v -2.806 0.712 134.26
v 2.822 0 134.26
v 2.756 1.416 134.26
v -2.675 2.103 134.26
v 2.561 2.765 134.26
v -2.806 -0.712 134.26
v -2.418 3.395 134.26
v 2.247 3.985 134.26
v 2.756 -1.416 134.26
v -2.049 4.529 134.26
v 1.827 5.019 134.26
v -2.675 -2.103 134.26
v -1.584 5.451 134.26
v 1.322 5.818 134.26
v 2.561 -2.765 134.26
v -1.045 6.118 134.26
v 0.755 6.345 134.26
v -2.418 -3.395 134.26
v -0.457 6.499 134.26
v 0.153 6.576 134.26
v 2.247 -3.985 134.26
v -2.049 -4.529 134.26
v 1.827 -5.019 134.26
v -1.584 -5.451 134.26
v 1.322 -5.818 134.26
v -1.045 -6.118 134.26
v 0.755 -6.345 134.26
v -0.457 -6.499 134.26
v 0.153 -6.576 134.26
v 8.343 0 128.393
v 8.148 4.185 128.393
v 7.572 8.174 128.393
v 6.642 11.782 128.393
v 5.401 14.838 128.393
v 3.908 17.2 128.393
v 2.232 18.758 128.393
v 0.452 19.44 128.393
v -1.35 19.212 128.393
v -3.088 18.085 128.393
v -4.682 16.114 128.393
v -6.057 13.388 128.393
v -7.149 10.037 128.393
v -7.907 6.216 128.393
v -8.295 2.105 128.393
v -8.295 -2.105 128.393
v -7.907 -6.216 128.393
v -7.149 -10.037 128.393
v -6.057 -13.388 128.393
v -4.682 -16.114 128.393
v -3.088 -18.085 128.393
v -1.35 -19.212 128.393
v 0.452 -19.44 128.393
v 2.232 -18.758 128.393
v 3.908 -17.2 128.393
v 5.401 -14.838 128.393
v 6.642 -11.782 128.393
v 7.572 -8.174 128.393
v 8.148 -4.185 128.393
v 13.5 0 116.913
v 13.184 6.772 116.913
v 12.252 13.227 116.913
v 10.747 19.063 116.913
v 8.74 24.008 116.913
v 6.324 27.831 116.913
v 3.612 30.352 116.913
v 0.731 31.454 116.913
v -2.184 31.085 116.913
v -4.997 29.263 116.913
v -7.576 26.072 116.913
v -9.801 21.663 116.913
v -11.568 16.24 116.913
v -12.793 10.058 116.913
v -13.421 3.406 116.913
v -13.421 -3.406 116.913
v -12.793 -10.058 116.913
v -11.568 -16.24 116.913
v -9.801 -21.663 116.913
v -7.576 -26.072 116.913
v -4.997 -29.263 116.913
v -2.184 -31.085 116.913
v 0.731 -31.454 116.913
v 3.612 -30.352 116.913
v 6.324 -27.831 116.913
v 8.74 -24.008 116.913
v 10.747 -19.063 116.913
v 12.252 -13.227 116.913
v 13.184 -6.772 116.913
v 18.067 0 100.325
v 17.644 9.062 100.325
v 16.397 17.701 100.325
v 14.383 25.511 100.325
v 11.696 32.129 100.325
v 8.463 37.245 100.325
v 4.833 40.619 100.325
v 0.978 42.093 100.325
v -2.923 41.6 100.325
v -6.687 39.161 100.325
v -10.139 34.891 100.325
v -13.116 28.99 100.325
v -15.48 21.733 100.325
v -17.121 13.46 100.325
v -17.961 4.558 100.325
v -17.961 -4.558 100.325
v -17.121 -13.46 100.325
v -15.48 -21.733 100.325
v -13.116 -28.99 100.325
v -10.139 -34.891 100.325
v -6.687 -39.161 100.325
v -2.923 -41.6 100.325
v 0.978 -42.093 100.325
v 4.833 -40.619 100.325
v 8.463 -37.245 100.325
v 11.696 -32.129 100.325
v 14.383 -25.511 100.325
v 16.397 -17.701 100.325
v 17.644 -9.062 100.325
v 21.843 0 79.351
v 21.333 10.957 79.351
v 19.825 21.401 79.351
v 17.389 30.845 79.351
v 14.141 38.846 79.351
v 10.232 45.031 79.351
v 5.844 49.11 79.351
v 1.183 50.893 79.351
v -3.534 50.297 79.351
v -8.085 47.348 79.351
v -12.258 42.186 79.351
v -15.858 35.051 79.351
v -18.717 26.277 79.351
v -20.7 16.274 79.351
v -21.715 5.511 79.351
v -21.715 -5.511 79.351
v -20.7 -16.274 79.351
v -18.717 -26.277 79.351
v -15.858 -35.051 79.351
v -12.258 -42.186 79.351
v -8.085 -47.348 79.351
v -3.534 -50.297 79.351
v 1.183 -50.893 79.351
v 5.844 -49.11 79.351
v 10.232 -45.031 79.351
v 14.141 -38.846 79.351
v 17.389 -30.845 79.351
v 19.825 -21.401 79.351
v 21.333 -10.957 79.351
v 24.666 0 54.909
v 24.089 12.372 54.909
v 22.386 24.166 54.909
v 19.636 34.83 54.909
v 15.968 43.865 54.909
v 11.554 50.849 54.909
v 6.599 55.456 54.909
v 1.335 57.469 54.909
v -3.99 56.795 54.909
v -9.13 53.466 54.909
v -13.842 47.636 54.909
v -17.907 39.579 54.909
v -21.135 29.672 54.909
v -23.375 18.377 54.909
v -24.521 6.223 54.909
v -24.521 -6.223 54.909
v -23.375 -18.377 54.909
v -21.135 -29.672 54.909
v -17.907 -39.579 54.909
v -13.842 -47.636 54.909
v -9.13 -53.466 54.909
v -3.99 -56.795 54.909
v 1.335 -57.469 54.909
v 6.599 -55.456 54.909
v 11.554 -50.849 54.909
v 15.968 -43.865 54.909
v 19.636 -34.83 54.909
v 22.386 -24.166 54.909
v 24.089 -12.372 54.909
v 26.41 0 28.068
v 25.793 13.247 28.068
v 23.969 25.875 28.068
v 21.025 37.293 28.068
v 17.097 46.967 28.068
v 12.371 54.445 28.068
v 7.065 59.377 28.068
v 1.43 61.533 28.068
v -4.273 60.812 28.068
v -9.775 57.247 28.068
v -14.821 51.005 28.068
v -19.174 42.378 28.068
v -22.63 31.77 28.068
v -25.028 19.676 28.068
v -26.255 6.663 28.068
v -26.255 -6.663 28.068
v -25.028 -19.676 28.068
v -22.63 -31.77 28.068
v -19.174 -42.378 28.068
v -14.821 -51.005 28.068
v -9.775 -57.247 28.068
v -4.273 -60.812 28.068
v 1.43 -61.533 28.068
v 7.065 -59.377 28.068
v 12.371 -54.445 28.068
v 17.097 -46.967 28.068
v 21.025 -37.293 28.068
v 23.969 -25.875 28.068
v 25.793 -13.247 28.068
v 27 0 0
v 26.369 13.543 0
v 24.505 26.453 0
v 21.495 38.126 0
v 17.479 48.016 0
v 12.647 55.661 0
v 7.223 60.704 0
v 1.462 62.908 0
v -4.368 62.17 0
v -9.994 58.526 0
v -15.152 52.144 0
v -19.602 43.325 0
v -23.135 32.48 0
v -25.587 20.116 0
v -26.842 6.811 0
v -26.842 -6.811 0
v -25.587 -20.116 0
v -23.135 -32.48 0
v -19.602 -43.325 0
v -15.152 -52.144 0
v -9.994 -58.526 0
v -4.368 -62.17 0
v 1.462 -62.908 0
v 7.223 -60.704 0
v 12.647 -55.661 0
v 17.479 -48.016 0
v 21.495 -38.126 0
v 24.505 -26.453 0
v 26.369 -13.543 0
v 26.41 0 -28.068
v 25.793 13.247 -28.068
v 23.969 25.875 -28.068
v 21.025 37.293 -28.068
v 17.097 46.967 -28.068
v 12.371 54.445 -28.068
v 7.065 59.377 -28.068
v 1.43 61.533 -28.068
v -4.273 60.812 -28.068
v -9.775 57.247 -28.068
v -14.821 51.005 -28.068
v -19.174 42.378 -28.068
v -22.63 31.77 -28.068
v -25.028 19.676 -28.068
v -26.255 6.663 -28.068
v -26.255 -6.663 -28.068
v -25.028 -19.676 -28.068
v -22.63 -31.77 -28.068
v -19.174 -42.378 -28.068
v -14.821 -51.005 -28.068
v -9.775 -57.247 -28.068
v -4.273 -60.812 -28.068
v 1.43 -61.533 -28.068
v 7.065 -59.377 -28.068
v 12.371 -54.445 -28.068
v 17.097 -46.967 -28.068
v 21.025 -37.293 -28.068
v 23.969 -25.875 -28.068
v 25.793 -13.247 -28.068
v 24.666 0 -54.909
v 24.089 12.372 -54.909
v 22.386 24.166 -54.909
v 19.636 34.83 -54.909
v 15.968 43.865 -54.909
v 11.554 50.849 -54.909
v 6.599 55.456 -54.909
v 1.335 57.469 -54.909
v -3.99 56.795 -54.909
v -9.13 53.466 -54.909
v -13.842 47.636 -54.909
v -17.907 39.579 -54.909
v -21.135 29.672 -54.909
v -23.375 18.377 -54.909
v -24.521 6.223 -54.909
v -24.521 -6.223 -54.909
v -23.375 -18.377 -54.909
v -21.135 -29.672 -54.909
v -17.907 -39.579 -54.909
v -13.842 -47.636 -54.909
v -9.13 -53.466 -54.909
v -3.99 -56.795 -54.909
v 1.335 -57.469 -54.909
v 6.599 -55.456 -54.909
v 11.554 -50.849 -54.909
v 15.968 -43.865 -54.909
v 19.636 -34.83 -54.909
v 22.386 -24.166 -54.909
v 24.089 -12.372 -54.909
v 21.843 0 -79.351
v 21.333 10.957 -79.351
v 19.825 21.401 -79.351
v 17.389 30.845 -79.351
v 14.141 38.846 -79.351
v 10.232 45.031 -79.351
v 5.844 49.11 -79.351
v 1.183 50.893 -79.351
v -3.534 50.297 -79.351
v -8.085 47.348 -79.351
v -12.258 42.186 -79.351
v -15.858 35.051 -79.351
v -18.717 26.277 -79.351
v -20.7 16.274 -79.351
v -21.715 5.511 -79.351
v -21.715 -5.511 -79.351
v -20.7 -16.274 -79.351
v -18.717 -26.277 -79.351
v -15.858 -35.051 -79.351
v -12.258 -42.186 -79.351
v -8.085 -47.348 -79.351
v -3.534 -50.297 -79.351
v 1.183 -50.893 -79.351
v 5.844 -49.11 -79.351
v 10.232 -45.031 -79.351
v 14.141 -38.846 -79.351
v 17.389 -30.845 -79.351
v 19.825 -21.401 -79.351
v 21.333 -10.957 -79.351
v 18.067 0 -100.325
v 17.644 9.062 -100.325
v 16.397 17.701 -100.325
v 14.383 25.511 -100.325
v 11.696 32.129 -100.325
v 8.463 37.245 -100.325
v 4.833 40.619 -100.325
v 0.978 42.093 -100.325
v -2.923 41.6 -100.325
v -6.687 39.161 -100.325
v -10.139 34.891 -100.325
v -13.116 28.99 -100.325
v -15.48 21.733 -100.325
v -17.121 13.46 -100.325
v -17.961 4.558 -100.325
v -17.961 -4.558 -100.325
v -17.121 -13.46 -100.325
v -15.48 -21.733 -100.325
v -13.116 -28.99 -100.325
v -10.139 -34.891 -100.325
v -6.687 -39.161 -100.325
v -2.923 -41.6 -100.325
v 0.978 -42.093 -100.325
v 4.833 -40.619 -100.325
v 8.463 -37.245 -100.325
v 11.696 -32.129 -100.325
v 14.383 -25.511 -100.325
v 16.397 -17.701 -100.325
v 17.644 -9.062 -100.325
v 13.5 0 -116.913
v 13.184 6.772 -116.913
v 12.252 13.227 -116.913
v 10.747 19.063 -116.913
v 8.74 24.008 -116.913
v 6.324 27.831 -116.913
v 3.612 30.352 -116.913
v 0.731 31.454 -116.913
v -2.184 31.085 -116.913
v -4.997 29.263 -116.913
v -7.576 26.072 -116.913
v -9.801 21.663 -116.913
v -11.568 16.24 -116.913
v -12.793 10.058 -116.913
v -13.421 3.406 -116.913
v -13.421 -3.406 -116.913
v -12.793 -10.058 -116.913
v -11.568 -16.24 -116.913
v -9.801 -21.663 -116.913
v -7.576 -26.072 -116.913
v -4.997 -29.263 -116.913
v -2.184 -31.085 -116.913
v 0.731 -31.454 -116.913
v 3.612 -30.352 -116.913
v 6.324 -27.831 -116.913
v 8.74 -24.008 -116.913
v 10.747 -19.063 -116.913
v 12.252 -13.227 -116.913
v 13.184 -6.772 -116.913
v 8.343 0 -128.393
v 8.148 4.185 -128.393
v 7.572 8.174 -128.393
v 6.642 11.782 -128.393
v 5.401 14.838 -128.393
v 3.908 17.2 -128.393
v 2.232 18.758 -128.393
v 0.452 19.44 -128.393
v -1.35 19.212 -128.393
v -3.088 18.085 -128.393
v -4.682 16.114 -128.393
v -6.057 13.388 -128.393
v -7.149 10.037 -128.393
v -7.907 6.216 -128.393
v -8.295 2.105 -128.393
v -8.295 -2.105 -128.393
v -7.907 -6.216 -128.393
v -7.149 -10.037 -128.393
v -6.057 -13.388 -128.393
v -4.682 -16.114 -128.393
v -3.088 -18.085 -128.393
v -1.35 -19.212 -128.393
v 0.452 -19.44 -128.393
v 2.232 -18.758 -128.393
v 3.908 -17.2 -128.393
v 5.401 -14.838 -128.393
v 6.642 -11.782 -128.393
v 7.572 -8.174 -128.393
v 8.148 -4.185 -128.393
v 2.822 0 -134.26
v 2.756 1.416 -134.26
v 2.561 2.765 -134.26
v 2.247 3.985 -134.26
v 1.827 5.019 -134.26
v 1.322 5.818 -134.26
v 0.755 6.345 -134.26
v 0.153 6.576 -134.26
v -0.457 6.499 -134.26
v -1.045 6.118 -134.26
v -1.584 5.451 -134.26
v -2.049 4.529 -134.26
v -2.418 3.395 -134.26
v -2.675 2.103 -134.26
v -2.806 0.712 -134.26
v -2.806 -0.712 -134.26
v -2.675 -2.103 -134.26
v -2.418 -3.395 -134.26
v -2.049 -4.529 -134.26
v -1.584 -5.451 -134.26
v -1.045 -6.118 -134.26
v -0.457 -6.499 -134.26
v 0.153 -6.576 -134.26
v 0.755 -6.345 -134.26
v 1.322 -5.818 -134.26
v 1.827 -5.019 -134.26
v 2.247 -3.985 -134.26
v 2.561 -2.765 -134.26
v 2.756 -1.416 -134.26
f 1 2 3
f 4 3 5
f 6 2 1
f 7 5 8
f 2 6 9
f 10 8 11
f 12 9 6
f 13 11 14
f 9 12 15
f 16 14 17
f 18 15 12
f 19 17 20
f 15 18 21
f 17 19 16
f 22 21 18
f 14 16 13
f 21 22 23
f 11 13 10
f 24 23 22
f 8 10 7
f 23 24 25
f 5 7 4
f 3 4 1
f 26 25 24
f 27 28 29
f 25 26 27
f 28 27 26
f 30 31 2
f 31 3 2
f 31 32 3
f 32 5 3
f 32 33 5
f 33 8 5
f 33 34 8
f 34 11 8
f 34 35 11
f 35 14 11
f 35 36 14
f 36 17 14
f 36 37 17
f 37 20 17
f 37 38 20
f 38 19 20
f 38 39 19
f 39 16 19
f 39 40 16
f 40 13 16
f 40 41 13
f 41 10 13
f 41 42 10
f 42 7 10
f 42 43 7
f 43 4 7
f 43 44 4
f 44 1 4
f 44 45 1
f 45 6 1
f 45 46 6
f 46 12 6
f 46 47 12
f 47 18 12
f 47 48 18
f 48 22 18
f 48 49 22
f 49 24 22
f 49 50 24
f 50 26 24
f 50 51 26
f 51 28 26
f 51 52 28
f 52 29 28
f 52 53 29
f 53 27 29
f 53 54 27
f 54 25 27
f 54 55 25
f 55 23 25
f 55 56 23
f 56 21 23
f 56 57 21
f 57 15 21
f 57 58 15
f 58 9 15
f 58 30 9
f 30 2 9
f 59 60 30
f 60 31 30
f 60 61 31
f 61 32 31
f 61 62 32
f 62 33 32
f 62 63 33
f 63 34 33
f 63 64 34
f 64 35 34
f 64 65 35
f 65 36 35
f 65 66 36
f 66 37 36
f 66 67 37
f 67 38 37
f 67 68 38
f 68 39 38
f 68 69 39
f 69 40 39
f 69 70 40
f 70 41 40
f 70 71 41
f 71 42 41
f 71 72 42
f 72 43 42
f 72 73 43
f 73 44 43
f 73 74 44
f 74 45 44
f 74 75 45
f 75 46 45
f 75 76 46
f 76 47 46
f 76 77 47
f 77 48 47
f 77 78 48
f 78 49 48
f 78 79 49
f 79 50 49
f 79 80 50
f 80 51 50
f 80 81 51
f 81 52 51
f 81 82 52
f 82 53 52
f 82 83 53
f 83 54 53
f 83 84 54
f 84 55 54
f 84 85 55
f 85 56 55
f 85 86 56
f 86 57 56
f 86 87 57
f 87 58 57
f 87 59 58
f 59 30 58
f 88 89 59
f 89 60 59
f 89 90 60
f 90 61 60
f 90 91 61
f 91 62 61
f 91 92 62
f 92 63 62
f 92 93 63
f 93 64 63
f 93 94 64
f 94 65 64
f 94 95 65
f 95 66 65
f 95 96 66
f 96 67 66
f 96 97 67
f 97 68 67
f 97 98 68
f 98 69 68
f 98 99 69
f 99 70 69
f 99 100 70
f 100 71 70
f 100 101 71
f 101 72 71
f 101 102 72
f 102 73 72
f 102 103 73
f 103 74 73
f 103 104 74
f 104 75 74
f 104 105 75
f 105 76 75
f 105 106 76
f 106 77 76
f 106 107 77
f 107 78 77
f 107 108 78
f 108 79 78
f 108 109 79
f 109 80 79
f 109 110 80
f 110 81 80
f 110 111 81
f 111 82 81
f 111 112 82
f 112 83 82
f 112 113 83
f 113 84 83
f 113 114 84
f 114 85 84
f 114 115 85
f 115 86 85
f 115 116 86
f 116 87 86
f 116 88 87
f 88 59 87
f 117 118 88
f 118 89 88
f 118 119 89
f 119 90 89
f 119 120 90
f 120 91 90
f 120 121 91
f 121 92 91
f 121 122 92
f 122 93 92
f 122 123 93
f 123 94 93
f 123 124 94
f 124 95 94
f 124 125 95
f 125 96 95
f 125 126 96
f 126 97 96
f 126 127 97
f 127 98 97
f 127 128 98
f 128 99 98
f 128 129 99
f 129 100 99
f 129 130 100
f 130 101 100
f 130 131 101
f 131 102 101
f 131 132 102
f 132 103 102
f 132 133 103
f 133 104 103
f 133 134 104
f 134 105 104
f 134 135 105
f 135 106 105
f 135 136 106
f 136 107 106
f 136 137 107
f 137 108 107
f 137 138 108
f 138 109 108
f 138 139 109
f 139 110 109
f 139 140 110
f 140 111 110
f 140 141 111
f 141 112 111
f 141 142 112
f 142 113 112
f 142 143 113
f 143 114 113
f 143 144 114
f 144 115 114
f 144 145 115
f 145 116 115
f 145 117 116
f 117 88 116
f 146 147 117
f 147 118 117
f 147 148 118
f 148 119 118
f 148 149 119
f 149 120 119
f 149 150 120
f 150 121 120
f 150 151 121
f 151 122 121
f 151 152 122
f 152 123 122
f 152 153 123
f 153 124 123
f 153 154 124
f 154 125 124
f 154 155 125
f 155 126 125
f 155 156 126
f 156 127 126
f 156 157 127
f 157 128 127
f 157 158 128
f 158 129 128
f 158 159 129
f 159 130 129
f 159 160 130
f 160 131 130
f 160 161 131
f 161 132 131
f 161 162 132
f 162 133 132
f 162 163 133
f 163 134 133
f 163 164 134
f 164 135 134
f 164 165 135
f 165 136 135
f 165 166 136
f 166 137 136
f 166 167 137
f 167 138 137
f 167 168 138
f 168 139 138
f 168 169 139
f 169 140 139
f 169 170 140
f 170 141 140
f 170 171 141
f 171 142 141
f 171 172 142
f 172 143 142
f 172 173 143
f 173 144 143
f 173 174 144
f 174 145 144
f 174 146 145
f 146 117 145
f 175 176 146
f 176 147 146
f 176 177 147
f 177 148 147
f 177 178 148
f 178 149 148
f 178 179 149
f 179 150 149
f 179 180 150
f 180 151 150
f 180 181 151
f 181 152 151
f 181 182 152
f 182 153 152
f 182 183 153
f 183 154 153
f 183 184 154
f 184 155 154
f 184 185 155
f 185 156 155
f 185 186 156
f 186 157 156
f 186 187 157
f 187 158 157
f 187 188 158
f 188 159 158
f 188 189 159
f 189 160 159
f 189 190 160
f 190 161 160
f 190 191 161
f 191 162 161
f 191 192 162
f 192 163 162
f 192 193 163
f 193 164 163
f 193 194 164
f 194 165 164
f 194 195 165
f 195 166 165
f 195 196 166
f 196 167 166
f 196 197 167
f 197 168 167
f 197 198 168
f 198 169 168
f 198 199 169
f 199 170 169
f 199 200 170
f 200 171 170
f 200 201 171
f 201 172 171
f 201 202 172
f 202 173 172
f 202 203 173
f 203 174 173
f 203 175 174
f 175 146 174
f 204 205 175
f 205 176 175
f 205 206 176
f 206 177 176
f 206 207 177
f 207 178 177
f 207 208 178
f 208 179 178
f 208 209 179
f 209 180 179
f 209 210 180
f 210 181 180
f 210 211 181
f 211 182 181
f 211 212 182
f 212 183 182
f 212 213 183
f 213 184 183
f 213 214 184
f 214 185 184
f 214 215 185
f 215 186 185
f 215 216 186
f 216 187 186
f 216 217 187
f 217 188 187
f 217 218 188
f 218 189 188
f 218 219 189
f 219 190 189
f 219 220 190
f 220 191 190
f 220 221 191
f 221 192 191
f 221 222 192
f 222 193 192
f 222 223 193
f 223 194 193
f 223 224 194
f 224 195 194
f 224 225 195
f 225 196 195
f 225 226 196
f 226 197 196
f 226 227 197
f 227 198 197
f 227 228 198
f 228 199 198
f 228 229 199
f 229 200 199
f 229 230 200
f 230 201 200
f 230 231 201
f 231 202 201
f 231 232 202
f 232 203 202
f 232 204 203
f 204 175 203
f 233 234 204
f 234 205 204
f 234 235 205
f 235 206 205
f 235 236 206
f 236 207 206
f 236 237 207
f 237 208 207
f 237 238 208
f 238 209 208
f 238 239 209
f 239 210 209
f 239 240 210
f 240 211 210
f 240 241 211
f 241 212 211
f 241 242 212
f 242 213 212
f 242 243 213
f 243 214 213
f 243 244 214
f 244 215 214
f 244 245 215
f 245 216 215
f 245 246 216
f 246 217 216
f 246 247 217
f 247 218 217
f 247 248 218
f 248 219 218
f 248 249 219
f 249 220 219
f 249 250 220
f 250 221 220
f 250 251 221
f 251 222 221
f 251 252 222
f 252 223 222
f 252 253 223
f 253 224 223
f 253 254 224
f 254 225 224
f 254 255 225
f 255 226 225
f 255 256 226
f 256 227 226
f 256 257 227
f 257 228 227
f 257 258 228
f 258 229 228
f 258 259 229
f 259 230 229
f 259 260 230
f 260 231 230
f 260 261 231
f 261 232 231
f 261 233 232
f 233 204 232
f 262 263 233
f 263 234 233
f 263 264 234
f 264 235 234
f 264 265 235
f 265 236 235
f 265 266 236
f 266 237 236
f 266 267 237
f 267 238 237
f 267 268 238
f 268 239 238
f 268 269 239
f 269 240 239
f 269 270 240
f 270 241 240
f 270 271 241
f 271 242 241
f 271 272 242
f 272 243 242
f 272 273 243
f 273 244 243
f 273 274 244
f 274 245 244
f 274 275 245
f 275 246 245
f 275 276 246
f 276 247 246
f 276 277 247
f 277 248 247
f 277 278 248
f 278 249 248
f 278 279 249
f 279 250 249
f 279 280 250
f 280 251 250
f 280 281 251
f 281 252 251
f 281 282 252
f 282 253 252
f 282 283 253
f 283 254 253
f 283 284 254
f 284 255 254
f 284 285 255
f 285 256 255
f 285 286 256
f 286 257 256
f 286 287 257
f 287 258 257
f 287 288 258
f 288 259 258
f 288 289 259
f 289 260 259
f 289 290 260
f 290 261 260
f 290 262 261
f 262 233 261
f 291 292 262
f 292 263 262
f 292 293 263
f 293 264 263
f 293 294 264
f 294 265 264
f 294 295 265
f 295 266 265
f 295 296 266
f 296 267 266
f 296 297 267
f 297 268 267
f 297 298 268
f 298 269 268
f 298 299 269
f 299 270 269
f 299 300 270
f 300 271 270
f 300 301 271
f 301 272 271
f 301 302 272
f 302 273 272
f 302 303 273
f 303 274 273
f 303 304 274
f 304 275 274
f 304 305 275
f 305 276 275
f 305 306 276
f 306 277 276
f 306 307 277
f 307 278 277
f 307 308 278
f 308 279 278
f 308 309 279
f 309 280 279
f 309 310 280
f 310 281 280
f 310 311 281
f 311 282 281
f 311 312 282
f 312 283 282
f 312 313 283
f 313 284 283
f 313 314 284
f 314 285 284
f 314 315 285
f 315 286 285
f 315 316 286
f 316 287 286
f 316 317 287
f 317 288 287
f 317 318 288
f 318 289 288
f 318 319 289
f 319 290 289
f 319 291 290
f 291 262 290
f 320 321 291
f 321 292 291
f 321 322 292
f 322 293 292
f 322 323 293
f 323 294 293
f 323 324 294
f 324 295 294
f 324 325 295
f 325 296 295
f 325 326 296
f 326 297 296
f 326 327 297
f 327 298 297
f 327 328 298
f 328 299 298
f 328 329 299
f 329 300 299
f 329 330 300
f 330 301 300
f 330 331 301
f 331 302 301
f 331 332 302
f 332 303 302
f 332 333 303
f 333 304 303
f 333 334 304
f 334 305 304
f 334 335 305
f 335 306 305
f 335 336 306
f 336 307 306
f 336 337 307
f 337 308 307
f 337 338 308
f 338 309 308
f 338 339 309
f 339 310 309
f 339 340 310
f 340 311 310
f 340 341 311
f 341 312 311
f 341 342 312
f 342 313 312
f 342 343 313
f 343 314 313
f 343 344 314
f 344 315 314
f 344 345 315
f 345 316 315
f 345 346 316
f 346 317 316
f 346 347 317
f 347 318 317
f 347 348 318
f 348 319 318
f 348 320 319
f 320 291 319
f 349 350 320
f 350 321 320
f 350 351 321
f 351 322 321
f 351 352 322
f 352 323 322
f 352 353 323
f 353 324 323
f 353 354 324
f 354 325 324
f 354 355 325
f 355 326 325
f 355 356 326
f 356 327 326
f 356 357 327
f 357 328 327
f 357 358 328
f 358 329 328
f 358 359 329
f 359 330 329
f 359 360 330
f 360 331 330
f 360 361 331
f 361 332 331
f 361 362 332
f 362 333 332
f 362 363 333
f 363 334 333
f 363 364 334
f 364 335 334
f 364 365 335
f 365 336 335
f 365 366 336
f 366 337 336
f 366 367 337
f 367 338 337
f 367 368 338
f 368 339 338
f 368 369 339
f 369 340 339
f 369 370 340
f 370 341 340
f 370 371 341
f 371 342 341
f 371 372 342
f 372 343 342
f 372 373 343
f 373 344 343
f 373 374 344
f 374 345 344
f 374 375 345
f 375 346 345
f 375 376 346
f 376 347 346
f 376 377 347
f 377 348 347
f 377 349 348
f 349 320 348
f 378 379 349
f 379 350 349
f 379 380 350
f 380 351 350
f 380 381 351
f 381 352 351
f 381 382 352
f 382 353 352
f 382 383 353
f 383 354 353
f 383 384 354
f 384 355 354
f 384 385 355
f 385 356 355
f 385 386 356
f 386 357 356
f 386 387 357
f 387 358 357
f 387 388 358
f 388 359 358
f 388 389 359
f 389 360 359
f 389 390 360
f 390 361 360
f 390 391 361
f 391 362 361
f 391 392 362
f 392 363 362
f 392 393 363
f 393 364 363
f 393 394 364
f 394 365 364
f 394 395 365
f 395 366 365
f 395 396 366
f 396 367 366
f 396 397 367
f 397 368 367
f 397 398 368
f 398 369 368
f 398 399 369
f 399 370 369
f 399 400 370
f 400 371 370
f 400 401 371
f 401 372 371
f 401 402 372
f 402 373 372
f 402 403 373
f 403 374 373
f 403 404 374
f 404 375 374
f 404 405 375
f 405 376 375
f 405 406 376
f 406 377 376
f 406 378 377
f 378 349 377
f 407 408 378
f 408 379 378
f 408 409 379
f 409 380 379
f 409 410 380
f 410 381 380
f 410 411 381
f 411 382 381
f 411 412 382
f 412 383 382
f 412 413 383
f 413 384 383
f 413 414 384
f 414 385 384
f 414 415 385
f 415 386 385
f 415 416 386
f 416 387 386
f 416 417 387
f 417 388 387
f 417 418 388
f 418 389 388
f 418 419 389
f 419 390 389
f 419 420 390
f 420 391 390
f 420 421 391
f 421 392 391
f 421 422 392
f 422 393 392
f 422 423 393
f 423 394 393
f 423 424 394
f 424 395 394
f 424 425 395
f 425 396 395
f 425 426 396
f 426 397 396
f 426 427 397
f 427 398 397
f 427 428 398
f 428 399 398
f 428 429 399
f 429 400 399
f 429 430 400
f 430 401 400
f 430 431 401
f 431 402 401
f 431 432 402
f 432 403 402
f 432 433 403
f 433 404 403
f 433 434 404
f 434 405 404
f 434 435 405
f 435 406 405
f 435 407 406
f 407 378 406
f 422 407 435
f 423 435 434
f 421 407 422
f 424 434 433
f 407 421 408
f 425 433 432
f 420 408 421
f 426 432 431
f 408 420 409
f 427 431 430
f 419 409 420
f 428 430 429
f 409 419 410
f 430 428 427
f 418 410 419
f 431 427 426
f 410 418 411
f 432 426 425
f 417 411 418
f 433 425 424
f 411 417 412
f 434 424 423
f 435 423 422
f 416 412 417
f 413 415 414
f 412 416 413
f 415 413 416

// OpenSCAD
// Generated by SolidPython 1.0.1 on 2020-07-29 00:46:45


scale(v = [3, 7, 15]) {
	sphere(r = 9);
}
/***********************************************
*********      SolidPython code:      **********
************************************************
 
# import packages: SolidPython
from solid import *
from solid.utils import *
from itertools import chain, combinations, permutations


class Resize:

    def __init__(self, scad_file):
        self.scad_file = scad_file
        #self.scad_file = import_scad(scad_file)
        # cone/cylinder param:
        self.r1 = 0
        self.r2 = 0
        self.h = 0
        # rectangular prism param:
        self.w = 0
        self.l = 0
        # ellipse param:
        self.r = 0

    # import OpenScad code (file name corresponds to shape)


    # classify shape + parameters
    def assign(self, param1, param2, param3):
        if self.scad_file == 'cone.scad':
            self.r1 = param1
            self.r2 = param2
            self.h = param3
        elif self.scad_file == 'cylinder.scad':
            self.r1 = param1
            self.r2 = param2
            self.h = param3
        elif self.scad_file == 'rectangularPrism.scad':
            self.h = param1
            self.l = param2
            self.w = param3
        else:
            self.r = param1
            self.h = param2

    # resize parameters
    def iterate(self):
        x = range(3, 20, 2)
        i = 1
        if self.scad_file == 'cone.scad':
            tempList = list(permutations(x, 2))
            for temp in tempList:
                param1 = temp[0]
                param2 = temp[1]
                filepath = 'produced_scad_files/' + 'cone' + str(param1) + '_' + str(param2) + '_' + '.scad'
                scad_render_to_file(cylinder(h=param1, r1=param2, r2=0), filepath)

        elif self.scad_file == 'cylinder.scad':
            tempList = list(permutations(x, 3))
            for temp in tempList:
                param1 = temp[0]
                param2 = temp[1]
                filepath = 'produced_scad_files/' + 'cylinder' + str(param1) + '_' + str(param2) + '_' + '.scad'
                scad_render_to_file(cylinder(h=param1, r1=param2, r2=param2), filepath)

        elif self.scad_file == 'rectangularPrism.scad':
            tempList = list(permutations(x, 3))
            for temp in tempList:
                param1 = temp[0]
                param2 = temp[1]
                param3 = temp[2]
                filepath = 'produced_scad_files/' + 'rectangularPrism' + str(param1) + '_' + str(param2) + '_' + str(
                    param3) + '.scad'
                scad_render_to_file(cube(size=(param1, param2, param3)), filepath)

        elif self.scad_file == 'ellipse.scad':
            tempList = list(permutations(x, 4))
            for temp in tempList:
                param1 = temp[0]
                param2 = temp[1]
                param3 = temp[2]
                param4 = temp[3]
                filepath = 'produced_scad_files/' + 'ellipse' + str(param1) + '_' + str(param2) + '_' + str(param3) + '_' + str(param4) + '.scad'
                scad_render_to_file(scale([param1, param2, param3])(sphere(r=param4)), filepath)

    def render_to_scadfile(self):
        scad_render_to_file(scad, 'example.scad') 
 
************************************************/
